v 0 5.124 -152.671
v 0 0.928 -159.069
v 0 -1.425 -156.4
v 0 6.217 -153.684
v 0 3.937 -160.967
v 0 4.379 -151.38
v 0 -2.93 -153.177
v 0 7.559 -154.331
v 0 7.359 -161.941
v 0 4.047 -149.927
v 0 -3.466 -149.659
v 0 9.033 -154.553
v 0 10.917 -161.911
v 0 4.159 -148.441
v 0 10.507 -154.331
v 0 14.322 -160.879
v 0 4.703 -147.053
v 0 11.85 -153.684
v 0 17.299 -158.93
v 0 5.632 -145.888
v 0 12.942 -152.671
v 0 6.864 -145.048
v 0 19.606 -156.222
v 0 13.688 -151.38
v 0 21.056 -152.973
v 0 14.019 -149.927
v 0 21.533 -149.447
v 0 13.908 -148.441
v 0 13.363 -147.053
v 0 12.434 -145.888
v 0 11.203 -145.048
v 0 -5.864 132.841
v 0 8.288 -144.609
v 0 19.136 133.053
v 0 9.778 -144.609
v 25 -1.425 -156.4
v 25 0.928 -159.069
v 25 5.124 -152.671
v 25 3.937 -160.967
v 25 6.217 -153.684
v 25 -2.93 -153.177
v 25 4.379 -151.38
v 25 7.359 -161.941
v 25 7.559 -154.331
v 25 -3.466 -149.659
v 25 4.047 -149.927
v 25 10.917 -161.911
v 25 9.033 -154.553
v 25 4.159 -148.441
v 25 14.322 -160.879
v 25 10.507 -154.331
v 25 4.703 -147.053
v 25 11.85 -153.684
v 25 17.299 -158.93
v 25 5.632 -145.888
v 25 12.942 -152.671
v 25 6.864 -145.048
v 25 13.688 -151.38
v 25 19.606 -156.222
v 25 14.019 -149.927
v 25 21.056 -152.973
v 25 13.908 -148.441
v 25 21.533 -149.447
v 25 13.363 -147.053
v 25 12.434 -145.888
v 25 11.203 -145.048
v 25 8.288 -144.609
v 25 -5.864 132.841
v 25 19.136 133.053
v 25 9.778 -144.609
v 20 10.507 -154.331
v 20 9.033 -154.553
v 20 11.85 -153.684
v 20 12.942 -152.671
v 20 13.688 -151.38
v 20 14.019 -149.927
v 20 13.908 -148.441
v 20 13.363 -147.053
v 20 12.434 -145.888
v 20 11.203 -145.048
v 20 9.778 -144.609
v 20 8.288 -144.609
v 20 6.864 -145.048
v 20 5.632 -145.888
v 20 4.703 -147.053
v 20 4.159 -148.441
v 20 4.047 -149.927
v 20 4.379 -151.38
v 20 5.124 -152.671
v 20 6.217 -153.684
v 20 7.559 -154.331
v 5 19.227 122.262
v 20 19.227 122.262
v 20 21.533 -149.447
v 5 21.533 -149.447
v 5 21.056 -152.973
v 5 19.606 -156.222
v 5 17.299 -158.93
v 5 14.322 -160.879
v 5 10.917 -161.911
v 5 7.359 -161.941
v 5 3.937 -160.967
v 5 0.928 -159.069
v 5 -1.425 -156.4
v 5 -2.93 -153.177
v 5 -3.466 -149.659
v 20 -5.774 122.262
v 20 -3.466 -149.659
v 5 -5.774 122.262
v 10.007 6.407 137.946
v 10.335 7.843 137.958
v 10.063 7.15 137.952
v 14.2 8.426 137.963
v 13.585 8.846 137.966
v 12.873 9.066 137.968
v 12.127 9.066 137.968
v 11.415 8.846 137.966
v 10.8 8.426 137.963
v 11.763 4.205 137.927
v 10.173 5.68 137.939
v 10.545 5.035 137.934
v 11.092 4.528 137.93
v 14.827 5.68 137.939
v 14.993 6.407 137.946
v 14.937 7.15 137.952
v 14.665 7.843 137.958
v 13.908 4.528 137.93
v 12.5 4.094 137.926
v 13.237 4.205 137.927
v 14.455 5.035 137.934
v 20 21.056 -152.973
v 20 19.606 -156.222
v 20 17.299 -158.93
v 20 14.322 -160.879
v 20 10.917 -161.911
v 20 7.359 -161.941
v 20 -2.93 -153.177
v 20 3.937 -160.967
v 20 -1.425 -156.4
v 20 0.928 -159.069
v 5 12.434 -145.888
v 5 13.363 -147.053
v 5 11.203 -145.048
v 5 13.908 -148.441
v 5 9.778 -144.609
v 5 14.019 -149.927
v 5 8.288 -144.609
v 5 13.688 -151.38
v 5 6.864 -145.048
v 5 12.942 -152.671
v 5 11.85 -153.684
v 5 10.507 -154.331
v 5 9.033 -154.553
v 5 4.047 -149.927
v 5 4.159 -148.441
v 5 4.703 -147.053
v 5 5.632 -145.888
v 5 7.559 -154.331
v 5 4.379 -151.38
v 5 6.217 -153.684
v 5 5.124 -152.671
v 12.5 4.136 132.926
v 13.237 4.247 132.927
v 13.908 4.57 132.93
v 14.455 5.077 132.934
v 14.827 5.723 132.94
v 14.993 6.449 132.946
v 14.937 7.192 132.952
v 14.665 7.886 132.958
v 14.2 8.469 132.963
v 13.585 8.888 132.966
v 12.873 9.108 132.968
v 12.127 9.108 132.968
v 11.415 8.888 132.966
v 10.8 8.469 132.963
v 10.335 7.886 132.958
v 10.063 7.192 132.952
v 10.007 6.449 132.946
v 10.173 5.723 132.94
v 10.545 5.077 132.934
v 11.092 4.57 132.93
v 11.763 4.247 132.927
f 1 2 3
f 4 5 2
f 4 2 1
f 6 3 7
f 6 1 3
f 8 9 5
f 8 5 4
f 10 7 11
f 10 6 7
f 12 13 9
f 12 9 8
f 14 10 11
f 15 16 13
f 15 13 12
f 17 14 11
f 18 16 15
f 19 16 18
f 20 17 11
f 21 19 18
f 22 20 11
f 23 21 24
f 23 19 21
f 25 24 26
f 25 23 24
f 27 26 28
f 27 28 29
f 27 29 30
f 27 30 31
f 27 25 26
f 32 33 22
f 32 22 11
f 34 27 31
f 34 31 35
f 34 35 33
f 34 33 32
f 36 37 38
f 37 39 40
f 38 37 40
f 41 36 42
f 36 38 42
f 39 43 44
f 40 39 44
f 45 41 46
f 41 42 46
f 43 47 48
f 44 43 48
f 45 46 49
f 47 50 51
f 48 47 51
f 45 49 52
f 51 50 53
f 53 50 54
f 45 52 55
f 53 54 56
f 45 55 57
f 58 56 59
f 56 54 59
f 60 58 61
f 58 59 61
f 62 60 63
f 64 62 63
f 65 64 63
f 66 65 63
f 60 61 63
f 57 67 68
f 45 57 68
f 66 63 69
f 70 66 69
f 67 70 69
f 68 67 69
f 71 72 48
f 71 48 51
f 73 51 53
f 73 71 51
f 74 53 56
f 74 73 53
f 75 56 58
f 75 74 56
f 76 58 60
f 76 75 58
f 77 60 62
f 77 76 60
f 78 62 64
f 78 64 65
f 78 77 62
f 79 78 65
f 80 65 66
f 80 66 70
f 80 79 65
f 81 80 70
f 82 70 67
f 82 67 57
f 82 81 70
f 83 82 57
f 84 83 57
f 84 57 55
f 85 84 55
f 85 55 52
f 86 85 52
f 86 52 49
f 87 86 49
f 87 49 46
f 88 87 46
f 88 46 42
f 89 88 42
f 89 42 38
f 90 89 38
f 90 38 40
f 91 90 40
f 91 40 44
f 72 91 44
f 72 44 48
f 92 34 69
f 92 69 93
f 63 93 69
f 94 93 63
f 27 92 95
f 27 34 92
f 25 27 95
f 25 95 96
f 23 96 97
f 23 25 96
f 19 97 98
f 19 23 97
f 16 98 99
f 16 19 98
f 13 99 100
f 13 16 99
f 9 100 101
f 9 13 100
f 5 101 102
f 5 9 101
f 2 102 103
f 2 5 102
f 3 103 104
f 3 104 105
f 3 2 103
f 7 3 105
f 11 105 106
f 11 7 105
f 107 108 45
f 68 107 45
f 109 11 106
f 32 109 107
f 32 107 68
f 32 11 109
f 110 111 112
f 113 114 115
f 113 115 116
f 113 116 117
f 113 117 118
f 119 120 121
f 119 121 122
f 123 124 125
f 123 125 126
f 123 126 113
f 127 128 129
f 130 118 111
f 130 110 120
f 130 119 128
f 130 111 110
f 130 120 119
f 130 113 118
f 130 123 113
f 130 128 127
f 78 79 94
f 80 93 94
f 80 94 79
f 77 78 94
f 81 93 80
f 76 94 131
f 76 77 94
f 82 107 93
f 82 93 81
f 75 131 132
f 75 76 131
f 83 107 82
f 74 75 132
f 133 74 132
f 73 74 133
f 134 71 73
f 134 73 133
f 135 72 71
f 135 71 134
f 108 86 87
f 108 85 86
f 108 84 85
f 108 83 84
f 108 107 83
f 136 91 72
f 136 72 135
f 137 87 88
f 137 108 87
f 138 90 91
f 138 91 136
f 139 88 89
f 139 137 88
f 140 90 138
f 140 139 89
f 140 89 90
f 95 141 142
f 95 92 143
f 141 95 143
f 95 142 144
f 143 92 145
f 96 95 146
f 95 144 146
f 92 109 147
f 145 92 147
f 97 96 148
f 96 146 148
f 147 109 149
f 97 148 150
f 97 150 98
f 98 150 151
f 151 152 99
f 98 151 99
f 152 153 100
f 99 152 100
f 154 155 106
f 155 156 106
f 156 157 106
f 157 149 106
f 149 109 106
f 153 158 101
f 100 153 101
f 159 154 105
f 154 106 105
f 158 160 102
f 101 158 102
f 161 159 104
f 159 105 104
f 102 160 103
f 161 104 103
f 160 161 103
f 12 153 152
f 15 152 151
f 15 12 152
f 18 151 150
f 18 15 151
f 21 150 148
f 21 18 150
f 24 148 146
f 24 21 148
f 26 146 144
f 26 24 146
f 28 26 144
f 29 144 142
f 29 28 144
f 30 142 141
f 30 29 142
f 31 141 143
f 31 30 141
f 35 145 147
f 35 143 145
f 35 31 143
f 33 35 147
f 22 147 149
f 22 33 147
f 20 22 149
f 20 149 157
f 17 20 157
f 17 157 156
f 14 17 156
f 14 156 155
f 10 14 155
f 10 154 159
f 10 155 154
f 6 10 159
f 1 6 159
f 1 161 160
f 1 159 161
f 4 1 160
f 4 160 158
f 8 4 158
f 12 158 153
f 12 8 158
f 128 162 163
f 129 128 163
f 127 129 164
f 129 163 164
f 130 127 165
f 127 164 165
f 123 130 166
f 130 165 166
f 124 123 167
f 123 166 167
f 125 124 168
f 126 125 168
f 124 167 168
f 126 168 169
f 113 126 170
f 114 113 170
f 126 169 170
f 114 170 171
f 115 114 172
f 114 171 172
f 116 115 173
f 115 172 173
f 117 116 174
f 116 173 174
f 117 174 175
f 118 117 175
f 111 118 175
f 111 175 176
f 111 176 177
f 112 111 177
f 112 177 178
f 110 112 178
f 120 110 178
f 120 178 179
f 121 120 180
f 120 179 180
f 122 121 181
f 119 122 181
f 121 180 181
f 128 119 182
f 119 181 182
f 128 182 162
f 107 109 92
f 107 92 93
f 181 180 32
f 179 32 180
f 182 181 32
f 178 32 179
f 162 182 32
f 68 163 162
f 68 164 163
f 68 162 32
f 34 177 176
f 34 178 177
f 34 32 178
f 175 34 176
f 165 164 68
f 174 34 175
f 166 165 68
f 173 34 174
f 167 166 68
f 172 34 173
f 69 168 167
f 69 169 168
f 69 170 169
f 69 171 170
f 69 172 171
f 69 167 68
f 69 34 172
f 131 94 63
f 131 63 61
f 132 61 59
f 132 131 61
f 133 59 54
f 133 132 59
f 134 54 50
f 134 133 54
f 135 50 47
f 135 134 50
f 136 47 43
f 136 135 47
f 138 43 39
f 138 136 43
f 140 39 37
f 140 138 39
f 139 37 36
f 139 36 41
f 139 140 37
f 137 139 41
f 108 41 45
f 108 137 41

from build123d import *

# Parameters (mm, degrees)
SKETCH1_R               = 5
BOSS_EXTRUDE1_DEPTH     = 25
CUT_EXTRUDE1_DEPTH      = 35
CUT_EXTRUDE1_DEPTH_BACK = 15
SKETCH2_W               = 15
SKETCH2_H               = 290
SKETCH3_R               = 5
CUT_EXTRUDE4_DEPTH      = 40
SKETCH7_W               = 25
SKETCH7_H               = 28.664698835
CUT_EXTRUDE7_DEPTH      = 30
SKETCH9_R               = 2.5
BOSS_EXTRUDE3_DEPTH     = 5


with BuildPart() as part:
    # Sketch1 → Boss-Extrude1 (new body)
    with BuildSketch(Plane(origin=(0, 0, 0), x_dir=(0, 0, -1), z_dir=(1, 0, 0))):
        with BuildLine():
            Line((-150.552761917, 18.987019815), (149.447238083, 21.532711721))
            ThreePointArc((149.447238083, 21.532711721), (162.052854746, 9.139228412), (149.659371437, -3.466388252))
            Line((149.659371437, -3.466388252), (-150.340628563, -6.012080158))
            ThreePointArc((-150.340628563, -6.012080158), (-162.946245226, 6.381403151), (-150.552761917, 18.987019815))
        make_face()
        with Locations((149.55330476, 9.033161734)):
            Circle(SKETCH1_R, mode=Mode.SUBTRACT)
    extrude(amount=BOSS_EXTRUDE1_DEPTH)

    # Sketch2 → Cut-Extrude1 (cut, two sides: drawn at the far end of the back side and taken through both)
    with BuildSketch(Plane(origin=(0, 0, 0), x_dir=(1, 0, 0), z_dir=(0, 1, 0)).offset(-CUT_EXTRUDE1_DEPTH_BACK)):
        with Locations((12.5, 22.738394002)):
            Rectangle(SKETCH2_W, SKETCH2_H)
    extrude(amount=CUT_EXTRUDE1_DEPTH + CUT_EXTRUDE1_DEPTH_BACK, mode=Mode.SUBTRACT)

    # Sketch3 → Cut-Extrude4 (cut)
    with BuildSketch(Plane(origin=(25, 0, 0), x_dir=(0, 0, -1), z_dir=(1, 0, 0))):
        with Locations((-150.44669524, 6.487469828)):
            Circle(SKETCH3_R)
    extrude(amount=-CUT_EXTRUDE4_DEPTH, mode=Mode.SUBTRACT)

    # Sketch7 → Cut-Extrude7 (cut)
    with BuildSketch(Plane(origin=(0, -1.382144103, 162.880366562), x_dir=(1, 0, 0), z_dir=(0, -0.008485334194353043, 0.9999639989037656))):
        with Locations((12.5, 7.004905365)):
            Rectangle(SKETCH7_W, SKETCH7_H)
    extrude(amount=-CUT_EXTRUDE7_DEPTH, mode=Mode.SUBTRACT)

    # Sketch9 → Boss-Extrude3 (add)
    with BuildSketch(Plane(origin=(0, -1.127584077, 132.881446595), x_dir=(1, 0, 0), z_dir=(0, -0.008485334194353164, 0.9999639989037656))):
        with Locations(Location((12.5, 7.76382676, 0), (0, 0, 270))):
            Circle(SKETCH9_R)
    extrude(amount=BOSS_EXTRUDE3_DEPTH)


solid = part.part
